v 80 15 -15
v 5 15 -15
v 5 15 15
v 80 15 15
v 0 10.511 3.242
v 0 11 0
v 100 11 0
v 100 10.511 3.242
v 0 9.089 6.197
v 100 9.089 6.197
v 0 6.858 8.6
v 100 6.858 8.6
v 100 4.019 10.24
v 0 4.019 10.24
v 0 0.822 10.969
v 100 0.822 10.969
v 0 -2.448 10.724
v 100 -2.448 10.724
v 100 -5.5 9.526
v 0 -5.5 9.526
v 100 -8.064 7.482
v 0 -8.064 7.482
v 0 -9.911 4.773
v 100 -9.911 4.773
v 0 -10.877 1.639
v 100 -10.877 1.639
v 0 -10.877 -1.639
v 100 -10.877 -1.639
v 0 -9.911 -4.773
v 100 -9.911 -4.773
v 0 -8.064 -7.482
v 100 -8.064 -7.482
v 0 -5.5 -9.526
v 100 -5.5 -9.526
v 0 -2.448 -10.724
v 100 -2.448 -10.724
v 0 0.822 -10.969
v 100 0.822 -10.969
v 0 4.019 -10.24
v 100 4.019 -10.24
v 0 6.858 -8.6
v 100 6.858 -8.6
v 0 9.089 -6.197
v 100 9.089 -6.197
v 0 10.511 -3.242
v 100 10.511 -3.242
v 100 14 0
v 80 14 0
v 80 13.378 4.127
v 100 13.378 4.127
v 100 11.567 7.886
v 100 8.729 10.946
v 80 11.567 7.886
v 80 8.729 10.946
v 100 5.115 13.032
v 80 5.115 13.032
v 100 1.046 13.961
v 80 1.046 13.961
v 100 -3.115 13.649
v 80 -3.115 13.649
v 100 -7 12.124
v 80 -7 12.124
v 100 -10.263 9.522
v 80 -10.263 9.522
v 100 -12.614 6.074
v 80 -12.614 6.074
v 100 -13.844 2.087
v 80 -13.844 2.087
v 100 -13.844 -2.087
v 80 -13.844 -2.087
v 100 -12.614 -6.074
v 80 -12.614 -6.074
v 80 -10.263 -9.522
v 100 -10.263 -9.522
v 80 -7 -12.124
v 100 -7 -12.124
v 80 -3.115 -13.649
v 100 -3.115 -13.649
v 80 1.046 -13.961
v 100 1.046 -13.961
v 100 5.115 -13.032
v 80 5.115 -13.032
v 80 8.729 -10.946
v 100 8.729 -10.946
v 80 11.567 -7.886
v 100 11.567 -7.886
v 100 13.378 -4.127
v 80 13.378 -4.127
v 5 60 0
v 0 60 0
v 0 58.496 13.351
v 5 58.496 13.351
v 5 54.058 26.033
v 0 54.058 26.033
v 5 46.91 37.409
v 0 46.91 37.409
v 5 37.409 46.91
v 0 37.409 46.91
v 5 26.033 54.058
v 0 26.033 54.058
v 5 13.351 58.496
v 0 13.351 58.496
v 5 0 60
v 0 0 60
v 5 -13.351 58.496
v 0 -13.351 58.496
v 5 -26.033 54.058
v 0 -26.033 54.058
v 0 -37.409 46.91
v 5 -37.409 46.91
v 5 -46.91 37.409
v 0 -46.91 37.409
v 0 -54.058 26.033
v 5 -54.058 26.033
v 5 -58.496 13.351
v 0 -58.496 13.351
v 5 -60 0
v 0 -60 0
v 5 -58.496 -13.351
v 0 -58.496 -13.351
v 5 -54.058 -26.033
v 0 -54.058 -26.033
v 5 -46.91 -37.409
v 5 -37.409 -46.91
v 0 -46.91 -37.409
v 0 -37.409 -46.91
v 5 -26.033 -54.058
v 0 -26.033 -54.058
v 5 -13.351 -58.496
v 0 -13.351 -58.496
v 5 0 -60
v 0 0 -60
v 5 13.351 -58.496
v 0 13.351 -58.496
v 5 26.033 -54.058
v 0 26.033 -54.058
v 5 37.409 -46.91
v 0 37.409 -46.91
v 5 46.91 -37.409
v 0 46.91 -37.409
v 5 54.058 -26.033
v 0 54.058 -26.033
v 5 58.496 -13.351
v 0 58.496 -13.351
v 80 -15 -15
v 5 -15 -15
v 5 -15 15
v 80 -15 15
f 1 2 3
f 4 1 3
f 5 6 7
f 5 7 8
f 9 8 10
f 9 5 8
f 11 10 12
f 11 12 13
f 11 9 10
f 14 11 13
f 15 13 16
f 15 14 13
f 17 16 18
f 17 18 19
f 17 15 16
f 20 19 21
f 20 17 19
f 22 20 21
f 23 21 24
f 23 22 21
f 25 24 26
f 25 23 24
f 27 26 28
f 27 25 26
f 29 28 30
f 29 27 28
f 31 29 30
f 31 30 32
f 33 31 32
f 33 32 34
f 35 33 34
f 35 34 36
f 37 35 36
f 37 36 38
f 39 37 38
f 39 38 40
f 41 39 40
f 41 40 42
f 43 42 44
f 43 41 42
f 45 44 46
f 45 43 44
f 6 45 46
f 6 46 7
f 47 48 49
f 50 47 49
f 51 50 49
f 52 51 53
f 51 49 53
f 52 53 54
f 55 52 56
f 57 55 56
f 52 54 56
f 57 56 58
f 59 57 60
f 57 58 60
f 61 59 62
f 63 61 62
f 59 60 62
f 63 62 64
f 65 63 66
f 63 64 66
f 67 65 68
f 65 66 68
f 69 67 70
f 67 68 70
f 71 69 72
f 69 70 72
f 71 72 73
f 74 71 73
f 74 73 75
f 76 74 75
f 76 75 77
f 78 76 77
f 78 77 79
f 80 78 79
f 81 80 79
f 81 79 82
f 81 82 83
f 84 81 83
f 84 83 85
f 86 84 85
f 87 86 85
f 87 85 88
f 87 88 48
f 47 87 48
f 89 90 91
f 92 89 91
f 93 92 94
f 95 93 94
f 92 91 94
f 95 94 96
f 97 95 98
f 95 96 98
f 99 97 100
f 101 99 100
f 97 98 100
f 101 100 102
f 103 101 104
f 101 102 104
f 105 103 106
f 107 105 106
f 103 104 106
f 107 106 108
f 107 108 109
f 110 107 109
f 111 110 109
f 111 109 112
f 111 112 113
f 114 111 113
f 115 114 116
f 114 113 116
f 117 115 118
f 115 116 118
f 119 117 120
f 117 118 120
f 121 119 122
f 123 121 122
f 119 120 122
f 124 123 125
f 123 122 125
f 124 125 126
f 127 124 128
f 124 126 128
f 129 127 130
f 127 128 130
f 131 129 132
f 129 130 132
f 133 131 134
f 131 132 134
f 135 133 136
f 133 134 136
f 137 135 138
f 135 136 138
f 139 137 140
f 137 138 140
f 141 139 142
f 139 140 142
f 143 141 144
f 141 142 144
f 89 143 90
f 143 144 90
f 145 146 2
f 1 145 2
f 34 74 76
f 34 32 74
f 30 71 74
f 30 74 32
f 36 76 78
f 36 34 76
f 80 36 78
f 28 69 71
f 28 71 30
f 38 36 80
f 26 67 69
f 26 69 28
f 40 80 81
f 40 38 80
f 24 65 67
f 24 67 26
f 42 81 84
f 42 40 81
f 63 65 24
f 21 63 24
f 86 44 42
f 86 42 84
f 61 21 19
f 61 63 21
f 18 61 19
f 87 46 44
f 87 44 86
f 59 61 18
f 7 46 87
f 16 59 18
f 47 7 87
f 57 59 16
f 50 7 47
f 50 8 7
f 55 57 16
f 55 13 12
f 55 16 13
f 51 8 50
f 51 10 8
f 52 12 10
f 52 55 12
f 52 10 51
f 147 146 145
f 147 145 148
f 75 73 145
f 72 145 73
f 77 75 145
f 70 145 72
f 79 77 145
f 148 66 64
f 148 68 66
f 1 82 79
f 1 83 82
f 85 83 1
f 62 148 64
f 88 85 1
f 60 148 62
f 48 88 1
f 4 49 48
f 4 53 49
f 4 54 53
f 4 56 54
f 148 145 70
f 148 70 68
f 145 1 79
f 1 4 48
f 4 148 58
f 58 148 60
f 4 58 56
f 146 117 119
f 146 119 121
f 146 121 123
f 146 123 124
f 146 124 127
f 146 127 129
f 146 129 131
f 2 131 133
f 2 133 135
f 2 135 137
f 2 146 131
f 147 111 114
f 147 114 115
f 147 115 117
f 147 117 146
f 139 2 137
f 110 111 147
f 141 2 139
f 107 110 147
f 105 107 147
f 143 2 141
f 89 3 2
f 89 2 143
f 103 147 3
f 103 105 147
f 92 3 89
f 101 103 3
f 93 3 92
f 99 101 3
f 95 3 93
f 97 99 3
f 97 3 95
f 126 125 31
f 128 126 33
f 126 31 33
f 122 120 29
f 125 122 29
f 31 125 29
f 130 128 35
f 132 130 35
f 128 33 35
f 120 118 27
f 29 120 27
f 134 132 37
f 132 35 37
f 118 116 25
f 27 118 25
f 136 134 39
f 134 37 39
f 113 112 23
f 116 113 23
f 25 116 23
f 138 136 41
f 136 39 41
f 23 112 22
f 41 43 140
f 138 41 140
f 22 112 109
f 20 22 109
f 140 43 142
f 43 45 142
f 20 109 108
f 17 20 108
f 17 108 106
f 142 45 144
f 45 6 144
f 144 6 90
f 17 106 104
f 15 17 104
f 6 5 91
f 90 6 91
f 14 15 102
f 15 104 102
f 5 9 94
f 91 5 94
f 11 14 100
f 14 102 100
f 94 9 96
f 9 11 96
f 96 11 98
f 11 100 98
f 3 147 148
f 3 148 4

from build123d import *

# Parameters (mm, degrees)
F0_R     = 14
F0_R_2   = 11
F1_DEPTH = 100
F0_W     = 30
F0_H     = 30
F2_DEPTH = 80
F0_R_3   = 60
F3_DEPTH = 5


with BuildPart() as f1:
    # F0 (on Right) → F1 (new body)
    with BuildSketch(Plane.YZ):
        Circle(F0_R)
        Circle(F0_R_2, mode=Mode.SUBTRACT)
    extrude(amount=F1_DEPTH)

    # F0 (on Right) → F2 (join)
    with BuildSketch(Plane.YZ):
        Rectangle(F0_W, F0_H)
        Circle(F0_R, mode=Mode.SUBTRACT)
    extrude(amount=F2_DEPTH)

    # F0 (on Right) → F3 (join)
    with BuildSketch(Plane.YZ):
        Circle(F0_R_3)
        Rectangle(F0_W, F0_H, mode=Mode.SUBTRACT)
    extrude(amount=F3_DEPTH)


solid = f1.part
